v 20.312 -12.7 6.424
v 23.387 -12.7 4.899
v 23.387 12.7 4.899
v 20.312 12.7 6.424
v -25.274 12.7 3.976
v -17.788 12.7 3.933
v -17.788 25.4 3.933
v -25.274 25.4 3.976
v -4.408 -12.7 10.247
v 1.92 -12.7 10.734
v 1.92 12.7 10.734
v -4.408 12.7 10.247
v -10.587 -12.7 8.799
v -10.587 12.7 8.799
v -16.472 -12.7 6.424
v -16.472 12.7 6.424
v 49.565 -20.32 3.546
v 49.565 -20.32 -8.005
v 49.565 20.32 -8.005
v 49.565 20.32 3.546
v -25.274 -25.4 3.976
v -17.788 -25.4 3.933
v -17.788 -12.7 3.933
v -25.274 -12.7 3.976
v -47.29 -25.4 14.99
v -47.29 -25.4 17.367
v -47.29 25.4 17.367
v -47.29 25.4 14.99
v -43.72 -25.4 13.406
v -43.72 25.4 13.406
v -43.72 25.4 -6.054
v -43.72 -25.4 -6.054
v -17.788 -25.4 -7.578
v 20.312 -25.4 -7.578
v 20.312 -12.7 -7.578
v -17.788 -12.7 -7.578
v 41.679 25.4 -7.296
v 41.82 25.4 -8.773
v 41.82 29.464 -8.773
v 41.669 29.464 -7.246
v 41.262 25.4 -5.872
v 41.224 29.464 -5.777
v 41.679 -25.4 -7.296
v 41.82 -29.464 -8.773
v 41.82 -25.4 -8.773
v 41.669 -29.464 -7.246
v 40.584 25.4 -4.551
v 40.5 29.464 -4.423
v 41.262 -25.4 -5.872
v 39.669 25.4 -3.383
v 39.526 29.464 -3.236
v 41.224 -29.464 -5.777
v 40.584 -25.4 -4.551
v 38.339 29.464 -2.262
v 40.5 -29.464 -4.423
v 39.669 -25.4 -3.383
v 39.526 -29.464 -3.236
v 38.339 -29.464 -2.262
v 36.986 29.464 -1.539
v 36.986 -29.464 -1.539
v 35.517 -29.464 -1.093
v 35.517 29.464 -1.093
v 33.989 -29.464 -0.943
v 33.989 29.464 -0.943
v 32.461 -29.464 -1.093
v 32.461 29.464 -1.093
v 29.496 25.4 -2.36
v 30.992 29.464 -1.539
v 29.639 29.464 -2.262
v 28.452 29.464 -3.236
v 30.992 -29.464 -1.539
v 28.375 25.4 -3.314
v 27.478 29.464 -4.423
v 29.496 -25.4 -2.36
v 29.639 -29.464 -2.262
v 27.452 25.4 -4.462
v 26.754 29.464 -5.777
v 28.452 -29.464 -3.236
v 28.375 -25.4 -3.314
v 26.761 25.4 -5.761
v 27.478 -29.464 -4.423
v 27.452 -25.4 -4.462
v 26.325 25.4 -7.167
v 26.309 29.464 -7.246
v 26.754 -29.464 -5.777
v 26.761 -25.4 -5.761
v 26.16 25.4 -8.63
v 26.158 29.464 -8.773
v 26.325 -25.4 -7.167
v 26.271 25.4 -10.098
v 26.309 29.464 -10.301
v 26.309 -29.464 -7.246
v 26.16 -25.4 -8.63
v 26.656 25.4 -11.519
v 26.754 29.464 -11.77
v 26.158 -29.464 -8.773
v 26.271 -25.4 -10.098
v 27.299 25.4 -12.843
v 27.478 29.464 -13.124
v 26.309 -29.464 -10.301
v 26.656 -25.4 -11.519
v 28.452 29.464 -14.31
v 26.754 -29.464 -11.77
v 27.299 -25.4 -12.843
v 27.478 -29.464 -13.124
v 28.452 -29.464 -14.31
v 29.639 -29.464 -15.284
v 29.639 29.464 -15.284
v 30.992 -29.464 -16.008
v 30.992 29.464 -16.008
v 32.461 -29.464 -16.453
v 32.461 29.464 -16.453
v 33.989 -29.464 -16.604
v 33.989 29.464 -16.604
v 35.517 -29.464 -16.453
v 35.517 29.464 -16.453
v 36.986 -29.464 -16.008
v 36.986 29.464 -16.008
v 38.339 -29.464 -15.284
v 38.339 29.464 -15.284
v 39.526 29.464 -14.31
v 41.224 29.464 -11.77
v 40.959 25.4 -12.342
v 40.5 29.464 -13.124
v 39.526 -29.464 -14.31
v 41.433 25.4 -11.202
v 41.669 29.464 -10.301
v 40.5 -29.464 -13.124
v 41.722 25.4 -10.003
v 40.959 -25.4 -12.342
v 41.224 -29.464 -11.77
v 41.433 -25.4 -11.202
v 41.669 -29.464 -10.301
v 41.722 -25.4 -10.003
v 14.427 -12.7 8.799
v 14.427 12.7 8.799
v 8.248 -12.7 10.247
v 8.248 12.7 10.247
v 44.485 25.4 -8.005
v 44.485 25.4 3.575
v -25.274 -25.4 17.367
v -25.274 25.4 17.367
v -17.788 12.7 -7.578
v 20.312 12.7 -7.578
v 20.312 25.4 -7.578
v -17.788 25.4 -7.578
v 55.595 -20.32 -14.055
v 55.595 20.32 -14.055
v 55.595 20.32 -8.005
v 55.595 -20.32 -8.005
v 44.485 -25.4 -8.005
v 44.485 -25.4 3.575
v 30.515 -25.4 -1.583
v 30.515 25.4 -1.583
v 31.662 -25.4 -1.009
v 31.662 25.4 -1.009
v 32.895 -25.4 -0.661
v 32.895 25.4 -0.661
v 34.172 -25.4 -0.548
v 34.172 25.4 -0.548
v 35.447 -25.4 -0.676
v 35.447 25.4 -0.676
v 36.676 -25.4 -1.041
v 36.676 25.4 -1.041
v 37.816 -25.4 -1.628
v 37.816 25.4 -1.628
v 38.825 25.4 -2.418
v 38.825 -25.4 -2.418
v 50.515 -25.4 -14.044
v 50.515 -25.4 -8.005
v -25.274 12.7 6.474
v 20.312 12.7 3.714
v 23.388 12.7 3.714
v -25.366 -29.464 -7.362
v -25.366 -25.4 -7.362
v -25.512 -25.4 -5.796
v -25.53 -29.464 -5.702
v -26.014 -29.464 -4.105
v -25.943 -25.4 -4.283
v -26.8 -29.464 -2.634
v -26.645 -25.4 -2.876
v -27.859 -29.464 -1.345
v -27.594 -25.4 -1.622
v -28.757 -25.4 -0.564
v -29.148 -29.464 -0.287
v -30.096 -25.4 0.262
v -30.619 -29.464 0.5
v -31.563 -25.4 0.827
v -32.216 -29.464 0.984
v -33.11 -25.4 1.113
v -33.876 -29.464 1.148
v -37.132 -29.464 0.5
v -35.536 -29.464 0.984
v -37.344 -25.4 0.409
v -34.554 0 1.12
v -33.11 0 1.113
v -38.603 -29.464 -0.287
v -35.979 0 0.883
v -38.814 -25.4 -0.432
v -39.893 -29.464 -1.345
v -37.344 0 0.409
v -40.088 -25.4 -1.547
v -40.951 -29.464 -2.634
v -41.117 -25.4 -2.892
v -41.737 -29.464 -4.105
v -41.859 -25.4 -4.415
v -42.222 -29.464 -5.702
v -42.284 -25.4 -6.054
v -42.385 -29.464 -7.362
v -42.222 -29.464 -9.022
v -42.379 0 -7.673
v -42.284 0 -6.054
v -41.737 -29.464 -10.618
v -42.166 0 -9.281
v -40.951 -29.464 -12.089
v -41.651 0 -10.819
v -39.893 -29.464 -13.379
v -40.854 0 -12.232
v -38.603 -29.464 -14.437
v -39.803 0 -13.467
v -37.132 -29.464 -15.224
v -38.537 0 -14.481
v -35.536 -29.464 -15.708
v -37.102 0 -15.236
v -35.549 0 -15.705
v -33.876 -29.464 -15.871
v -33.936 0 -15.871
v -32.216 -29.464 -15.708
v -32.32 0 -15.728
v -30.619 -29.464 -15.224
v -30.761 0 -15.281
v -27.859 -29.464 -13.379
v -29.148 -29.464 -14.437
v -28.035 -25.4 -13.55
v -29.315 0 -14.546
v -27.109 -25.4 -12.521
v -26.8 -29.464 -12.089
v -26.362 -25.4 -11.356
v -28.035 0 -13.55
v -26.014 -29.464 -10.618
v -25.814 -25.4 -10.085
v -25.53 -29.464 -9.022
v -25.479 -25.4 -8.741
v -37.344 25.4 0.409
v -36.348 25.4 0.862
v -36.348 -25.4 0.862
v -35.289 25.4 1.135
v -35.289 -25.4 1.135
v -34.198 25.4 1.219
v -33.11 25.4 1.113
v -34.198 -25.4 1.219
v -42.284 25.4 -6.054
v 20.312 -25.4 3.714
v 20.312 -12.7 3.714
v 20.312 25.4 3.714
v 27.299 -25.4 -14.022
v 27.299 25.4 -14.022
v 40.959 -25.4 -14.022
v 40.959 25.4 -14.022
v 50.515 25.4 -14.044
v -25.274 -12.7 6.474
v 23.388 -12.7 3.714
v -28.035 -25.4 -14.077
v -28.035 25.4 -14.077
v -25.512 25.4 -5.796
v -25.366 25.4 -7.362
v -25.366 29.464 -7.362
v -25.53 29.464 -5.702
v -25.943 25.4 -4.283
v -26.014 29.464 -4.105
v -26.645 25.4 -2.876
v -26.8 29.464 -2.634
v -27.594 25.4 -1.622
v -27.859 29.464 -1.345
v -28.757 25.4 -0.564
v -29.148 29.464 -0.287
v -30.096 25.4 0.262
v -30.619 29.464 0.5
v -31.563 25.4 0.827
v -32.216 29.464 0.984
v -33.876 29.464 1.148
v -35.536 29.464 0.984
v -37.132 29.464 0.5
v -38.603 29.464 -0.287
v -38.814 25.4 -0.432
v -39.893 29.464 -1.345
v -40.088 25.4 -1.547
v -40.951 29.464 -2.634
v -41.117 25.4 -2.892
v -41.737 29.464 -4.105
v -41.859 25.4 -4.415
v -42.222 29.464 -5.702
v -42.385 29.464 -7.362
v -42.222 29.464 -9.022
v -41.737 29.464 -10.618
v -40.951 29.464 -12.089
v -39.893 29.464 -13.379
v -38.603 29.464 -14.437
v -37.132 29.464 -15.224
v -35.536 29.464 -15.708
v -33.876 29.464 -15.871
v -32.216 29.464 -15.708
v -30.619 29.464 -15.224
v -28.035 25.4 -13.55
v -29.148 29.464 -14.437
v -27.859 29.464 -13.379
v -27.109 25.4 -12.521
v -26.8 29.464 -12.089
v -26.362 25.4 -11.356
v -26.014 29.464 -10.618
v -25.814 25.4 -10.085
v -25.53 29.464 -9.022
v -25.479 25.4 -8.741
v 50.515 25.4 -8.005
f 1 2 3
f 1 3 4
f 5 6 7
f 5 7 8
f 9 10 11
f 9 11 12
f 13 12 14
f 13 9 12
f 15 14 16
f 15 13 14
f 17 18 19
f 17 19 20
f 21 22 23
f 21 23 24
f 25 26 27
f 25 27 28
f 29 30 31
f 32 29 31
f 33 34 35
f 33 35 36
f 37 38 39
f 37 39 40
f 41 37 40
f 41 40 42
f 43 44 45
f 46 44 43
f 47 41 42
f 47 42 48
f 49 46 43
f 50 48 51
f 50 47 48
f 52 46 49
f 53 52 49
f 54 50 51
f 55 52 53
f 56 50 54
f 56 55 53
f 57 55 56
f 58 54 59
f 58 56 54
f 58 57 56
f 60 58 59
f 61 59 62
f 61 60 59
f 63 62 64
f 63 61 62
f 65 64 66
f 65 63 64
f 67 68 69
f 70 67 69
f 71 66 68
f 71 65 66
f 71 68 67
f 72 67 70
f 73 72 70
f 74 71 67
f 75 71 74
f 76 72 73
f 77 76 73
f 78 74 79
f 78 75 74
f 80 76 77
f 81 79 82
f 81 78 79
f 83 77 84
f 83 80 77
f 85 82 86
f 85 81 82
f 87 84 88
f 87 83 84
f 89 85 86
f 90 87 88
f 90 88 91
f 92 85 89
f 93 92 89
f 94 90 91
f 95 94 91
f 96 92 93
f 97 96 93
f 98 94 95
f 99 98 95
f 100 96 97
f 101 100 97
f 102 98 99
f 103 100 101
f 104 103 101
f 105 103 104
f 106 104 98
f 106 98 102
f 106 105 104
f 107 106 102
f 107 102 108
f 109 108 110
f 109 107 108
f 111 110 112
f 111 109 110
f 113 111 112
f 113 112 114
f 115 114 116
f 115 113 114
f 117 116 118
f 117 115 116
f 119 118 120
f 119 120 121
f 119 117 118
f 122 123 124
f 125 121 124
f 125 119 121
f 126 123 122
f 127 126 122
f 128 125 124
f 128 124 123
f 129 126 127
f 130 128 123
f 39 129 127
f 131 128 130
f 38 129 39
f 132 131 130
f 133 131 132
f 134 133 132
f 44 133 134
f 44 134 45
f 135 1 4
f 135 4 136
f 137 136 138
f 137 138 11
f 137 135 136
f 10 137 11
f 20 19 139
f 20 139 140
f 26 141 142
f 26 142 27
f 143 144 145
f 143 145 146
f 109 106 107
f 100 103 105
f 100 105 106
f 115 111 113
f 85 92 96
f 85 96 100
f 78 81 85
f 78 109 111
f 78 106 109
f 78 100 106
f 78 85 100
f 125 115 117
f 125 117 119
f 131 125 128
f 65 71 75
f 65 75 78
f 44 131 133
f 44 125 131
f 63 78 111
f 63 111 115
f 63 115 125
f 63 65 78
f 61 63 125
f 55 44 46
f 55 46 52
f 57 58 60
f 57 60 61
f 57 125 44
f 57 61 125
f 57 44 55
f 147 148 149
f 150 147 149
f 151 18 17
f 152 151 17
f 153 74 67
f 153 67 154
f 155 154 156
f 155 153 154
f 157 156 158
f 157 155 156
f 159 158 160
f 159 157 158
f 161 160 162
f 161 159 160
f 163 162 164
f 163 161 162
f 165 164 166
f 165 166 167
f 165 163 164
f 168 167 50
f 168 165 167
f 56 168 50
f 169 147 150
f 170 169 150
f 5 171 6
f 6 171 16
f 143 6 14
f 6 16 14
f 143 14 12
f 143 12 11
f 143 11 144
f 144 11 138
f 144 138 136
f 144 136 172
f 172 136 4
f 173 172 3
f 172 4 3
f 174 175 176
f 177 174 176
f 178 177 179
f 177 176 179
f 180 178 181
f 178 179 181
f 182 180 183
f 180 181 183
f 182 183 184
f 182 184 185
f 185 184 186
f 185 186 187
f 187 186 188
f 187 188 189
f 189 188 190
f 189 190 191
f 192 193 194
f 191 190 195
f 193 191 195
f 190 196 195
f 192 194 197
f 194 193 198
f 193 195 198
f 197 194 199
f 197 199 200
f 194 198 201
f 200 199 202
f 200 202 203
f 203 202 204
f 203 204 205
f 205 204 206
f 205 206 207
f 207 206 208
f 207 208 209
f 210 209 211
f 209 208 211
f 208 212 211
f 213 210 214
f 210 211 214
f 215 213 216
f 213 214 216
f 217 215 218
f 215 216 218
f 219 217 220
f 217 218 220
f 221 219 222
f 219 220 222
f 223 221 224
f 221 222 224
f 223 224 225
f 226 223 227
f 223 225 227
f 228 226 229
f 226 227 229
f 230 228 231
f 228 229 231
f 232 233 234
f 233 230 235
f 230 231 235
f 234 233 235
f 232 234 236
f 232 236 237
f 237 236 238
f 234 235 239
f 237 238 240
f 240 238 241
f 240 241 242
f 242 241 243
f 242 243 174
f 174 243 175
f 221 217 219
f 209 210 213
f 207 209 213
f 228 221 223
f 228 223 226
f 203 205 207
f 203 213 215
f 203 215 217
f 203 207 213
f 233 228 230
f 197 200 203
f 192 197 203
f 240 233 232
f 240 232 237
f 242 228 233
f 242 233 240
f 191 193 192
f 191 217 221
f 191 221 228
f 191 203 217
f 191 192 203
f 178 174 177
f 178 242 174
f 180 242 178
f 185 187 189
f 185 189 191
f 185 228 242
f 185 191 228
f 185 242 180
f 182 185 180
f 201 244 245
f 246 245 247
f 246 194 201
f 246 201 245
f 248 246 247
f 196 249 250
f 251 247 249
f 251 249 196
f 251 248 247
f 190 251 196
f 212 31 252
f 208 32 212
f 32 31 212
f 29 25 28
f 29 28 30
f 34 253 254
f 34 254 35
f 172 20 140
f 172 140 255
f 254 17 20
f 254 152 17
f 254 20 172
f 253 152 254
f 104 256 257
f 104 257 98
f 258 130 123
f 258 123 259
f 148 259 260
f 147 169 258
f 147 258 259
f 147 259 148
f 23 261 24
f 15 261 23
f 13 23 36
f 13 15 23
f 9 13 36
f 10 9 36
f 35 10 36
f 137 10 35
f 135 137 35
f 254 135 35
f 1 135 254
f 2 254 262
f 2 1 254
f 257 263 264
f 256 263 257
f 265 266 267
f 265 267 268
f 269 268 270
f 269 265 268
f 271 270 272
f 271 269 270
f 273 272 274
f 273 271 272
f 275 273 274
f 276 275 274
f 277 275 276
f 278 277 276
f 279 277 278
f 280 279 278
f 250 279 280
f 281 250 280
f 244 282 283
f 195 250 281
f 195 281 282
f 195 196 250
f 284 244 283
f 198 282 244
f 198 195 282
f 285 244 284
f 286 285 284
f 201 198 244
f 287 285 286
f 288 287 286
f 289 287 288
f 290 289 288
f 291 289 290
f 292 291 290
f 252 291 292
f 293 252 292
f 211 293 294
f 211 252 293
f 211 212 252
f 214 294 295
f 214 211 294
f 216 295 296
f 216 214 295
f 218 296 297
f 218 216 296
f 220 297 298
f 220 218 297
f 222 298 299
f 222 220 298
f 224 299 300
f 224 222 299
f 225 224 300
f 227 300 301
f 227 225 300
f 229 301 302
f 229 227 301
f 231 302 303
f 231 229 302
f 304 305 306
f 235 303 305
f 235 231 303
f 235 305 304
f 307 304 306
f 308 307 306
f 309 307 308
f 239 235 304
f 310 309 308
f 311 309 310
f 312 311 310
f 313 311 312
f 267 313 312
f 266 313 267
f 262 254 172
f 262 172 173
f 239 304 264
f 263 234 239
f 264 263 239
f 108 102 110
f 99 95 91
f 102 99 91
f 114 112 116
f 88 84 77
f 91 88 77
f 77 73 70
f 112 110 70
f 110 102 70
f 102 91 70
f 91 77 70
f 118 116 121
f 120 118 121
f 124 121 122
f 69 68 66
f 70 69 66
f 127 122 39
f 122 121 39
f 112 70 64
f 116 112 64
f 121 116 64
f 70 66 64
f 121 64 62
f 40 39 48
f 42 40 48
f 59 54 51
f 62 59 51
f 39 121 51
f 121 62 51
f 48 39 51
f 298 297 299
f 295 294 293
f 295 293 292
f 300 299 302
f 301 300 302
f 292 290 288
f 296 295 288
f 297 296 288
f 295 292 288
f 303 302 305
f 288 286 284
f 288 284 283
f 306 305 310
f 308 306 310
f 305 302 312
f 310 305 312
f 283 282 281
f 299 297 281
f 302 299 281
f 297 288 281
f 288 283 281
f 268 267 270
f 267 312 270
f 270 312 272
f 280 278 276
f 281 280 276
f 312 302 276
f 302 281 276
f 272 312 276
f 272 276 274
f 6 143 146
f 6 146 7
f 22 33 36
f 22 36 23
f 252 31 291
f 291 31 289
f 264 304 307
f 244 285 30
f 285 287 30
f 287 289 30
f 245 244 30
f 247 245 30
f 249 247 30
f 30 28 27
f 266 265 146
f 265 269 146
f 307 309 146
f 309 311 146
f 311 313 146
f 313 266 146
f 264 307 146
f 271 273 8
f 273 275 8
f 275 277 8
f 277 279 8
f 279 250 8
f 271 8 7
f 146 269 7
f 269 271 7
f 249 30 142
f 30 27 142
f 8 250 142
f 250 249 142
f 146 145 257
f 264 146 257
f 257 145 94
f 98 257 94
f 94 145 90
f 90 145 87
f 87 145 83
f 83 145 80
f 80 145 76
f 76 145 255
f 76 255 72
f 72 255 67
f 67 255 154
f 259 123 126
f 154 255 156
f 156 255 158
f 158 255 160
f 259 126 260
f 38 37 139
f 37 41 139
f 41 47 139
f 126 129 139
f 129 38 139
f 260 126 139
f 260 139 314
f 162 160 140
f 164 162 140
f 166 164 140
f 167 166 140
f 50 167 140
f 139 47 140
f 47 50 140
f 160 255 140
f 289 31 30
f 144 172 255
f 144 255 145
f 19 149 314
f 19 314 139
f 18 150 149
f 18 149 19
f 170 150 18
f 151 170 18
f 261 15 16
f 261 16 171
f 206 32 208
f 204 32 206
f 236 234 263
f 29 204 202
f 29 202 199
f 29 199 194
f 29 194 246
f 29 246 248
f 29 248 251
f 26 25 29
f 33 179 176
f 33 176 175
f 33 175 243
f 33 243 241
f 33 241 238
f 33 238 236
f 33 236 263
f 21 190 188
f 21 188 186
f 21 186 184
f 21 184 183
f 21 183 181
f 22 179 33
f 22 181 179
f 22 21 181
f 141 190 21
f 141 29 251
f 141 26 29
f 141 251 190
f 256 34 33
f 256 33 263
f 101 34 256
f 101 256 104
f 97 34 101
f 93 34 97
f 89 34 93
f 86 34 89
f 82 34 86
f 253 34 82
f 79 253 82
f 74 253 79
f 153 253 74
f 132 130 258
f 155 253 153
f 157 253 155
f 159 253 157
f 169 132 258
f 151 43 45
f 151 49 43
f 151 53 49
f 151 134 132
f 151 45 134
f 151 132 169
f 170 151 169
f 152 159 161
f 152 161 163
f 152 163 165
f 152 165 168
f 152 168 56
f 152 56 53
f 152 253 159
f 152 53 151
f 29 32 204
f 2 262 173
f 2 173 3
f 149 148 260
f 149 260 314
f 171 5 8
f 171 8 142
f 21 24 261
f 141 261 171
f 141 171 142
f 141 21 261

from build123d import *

# Parameters (mm, degrees)
F1_DEPTH = 25.4
F2_DEPTH = 12.7
F3_SIZE  = 5.08
F4_R     = 8.5094
F4_R_2   = 7.830617
F5_DEPTH = 29.464


with BuildPart() as f1:
    # F0 (on Front) → F1 (new body, symmetric)
    with BuildSketch(Plane.XZ):
        with BuildLine():
            Line((-28.034671, -4.311011), (-28.034671, -14.077194))
            Line((-28.034671, -14.077194), (27.299206, -14.022477))
            Line((27.299206, -14.022477), (27.299206, -7.378203))
            ThreePointArc((27.299206, -7.378203), (34.129328, -0.548081), (40.95945, -7.378203))
            Line((40.95945, -7.378203), (40.95945, -14.022477))
            Line((40.95945, -14.022477), (55.595427, -14.055348))
            Line((55.595427, -14.055348), (55.595427, -8.005464))
            Line((55.595427, -8.005464), (49.564611, -8.005464))
            Line((49.564611, -8.005464), (49.564611, 3.545878))
            Line((49.564611, 3.545878), (20.311819, 3.713833))
            Line((20.311819, 3.713833), (20.311819, -7.577809))
            Line((20.311819, -7.577809), (-17.788181, -7.57786))
            Line((-17.788181, -7.57786), (-17.788197, 3.932584))
            Line((-17.788197, 3.932584), (-25.274342, 3.975565))
            Line((-25.274342, 3.975565), (-25.274342, 6.474282))
            Line((-25.274342, 6.474282), (-25.274342, 17.366793))
            Line((-25.274342, 17.366793), (-47.289753, 17.366793))
            Line((-47.289753, 17.366793), (-47.289753, 14.9899))
            Line((-47.289753, 14.9899), (-43.719519, 13.406432))
            Line((-43.719519, 13.406432), (-43.719519, -6.054001))
            Line((-43.719519, -6.054001), (-40.48594, -6.054001))
            Line((-40.48594, -6.054001), (-40.48594, -4.311011))
            ThreePointArc((-40.48594, -4.311011), (-34.260305, 1.219482), (-28.034671, -4.311011))
        make_face()
    extrude(amount=F1_DEPTH, both=True)

    # F0 (on Front) → F2 (join, symmetric)
    with BuildSketch(Plane.XZ):
        Polygon((20.311819, -7.577809), (20.311819, 3.713833), (1.920144, 3.819428), (-16.471527, 3.925024), (-17.788197, 3.932584), (-17.788181, -7.57786), align=None)
        with BuildLine():
            Line((-16.471527, 3.925024), (1.920144, 3.819428))
            Line((1.920144, 3.819428), (1.920144, 10.733619))
            ThreePointArc((1.920144, 10.733619), (-7.524811, 9.64175), (-16.47153, 6.42374))
            Line((-16.47153, 6.42374), (-16.471527, 3.925024))
        make_face()
        Polygon((-16.47153, 6.42374), (-25.274342, 6.474282), (-25.274342, 3.975565), (-17.788197, 3.932584), (-16.471527, 3.925024), align=None)
        with BuildLine():
            Line((1.920144, 3.819428), (20.311819, 3.713833))
            Line((20.311819, 3.713833), (20.311819, 6.42374))
            ThreePointArc((20.311819, 6.42374), (11.3651, 9.64175), (1.920144, 10.733619))
            Line((1.920144, 10.733619), (1.920144, 3.819428))
        make_face()
        Polygon((20.311819, 6.42374), (20.311819, 3.713833), (23.388268, 3.713833), (23.387096, 4.89868), align=None)
    extrude(amount=F2_DEPTH, both=True)

    # F3
    f3_edges = [f1.edges().sort_by_distance(p)[0] for p in [
        (49.564611, 25.4, -2.229793),
        (55.595427, 25.4, -11.030406),
        (49.564611, -25.4, -2.229793),
        (55.595427, -25.4, -11.030406),
    ]]
    chamfer(f3_edges, length=F3_SIZE)

    # F4 (on Front) → F5 (join, symmetric)
    with BuildSketch(Plane.XZ):
        with Locations((-33.875754, -7.361865)):
            Circle(F4_R)
        with Locations((33.989035, -8.773327)):
            Circle(F4_R_2)
    extrude(amount=F5_DEPTH, both=True)


solid = f1.part
